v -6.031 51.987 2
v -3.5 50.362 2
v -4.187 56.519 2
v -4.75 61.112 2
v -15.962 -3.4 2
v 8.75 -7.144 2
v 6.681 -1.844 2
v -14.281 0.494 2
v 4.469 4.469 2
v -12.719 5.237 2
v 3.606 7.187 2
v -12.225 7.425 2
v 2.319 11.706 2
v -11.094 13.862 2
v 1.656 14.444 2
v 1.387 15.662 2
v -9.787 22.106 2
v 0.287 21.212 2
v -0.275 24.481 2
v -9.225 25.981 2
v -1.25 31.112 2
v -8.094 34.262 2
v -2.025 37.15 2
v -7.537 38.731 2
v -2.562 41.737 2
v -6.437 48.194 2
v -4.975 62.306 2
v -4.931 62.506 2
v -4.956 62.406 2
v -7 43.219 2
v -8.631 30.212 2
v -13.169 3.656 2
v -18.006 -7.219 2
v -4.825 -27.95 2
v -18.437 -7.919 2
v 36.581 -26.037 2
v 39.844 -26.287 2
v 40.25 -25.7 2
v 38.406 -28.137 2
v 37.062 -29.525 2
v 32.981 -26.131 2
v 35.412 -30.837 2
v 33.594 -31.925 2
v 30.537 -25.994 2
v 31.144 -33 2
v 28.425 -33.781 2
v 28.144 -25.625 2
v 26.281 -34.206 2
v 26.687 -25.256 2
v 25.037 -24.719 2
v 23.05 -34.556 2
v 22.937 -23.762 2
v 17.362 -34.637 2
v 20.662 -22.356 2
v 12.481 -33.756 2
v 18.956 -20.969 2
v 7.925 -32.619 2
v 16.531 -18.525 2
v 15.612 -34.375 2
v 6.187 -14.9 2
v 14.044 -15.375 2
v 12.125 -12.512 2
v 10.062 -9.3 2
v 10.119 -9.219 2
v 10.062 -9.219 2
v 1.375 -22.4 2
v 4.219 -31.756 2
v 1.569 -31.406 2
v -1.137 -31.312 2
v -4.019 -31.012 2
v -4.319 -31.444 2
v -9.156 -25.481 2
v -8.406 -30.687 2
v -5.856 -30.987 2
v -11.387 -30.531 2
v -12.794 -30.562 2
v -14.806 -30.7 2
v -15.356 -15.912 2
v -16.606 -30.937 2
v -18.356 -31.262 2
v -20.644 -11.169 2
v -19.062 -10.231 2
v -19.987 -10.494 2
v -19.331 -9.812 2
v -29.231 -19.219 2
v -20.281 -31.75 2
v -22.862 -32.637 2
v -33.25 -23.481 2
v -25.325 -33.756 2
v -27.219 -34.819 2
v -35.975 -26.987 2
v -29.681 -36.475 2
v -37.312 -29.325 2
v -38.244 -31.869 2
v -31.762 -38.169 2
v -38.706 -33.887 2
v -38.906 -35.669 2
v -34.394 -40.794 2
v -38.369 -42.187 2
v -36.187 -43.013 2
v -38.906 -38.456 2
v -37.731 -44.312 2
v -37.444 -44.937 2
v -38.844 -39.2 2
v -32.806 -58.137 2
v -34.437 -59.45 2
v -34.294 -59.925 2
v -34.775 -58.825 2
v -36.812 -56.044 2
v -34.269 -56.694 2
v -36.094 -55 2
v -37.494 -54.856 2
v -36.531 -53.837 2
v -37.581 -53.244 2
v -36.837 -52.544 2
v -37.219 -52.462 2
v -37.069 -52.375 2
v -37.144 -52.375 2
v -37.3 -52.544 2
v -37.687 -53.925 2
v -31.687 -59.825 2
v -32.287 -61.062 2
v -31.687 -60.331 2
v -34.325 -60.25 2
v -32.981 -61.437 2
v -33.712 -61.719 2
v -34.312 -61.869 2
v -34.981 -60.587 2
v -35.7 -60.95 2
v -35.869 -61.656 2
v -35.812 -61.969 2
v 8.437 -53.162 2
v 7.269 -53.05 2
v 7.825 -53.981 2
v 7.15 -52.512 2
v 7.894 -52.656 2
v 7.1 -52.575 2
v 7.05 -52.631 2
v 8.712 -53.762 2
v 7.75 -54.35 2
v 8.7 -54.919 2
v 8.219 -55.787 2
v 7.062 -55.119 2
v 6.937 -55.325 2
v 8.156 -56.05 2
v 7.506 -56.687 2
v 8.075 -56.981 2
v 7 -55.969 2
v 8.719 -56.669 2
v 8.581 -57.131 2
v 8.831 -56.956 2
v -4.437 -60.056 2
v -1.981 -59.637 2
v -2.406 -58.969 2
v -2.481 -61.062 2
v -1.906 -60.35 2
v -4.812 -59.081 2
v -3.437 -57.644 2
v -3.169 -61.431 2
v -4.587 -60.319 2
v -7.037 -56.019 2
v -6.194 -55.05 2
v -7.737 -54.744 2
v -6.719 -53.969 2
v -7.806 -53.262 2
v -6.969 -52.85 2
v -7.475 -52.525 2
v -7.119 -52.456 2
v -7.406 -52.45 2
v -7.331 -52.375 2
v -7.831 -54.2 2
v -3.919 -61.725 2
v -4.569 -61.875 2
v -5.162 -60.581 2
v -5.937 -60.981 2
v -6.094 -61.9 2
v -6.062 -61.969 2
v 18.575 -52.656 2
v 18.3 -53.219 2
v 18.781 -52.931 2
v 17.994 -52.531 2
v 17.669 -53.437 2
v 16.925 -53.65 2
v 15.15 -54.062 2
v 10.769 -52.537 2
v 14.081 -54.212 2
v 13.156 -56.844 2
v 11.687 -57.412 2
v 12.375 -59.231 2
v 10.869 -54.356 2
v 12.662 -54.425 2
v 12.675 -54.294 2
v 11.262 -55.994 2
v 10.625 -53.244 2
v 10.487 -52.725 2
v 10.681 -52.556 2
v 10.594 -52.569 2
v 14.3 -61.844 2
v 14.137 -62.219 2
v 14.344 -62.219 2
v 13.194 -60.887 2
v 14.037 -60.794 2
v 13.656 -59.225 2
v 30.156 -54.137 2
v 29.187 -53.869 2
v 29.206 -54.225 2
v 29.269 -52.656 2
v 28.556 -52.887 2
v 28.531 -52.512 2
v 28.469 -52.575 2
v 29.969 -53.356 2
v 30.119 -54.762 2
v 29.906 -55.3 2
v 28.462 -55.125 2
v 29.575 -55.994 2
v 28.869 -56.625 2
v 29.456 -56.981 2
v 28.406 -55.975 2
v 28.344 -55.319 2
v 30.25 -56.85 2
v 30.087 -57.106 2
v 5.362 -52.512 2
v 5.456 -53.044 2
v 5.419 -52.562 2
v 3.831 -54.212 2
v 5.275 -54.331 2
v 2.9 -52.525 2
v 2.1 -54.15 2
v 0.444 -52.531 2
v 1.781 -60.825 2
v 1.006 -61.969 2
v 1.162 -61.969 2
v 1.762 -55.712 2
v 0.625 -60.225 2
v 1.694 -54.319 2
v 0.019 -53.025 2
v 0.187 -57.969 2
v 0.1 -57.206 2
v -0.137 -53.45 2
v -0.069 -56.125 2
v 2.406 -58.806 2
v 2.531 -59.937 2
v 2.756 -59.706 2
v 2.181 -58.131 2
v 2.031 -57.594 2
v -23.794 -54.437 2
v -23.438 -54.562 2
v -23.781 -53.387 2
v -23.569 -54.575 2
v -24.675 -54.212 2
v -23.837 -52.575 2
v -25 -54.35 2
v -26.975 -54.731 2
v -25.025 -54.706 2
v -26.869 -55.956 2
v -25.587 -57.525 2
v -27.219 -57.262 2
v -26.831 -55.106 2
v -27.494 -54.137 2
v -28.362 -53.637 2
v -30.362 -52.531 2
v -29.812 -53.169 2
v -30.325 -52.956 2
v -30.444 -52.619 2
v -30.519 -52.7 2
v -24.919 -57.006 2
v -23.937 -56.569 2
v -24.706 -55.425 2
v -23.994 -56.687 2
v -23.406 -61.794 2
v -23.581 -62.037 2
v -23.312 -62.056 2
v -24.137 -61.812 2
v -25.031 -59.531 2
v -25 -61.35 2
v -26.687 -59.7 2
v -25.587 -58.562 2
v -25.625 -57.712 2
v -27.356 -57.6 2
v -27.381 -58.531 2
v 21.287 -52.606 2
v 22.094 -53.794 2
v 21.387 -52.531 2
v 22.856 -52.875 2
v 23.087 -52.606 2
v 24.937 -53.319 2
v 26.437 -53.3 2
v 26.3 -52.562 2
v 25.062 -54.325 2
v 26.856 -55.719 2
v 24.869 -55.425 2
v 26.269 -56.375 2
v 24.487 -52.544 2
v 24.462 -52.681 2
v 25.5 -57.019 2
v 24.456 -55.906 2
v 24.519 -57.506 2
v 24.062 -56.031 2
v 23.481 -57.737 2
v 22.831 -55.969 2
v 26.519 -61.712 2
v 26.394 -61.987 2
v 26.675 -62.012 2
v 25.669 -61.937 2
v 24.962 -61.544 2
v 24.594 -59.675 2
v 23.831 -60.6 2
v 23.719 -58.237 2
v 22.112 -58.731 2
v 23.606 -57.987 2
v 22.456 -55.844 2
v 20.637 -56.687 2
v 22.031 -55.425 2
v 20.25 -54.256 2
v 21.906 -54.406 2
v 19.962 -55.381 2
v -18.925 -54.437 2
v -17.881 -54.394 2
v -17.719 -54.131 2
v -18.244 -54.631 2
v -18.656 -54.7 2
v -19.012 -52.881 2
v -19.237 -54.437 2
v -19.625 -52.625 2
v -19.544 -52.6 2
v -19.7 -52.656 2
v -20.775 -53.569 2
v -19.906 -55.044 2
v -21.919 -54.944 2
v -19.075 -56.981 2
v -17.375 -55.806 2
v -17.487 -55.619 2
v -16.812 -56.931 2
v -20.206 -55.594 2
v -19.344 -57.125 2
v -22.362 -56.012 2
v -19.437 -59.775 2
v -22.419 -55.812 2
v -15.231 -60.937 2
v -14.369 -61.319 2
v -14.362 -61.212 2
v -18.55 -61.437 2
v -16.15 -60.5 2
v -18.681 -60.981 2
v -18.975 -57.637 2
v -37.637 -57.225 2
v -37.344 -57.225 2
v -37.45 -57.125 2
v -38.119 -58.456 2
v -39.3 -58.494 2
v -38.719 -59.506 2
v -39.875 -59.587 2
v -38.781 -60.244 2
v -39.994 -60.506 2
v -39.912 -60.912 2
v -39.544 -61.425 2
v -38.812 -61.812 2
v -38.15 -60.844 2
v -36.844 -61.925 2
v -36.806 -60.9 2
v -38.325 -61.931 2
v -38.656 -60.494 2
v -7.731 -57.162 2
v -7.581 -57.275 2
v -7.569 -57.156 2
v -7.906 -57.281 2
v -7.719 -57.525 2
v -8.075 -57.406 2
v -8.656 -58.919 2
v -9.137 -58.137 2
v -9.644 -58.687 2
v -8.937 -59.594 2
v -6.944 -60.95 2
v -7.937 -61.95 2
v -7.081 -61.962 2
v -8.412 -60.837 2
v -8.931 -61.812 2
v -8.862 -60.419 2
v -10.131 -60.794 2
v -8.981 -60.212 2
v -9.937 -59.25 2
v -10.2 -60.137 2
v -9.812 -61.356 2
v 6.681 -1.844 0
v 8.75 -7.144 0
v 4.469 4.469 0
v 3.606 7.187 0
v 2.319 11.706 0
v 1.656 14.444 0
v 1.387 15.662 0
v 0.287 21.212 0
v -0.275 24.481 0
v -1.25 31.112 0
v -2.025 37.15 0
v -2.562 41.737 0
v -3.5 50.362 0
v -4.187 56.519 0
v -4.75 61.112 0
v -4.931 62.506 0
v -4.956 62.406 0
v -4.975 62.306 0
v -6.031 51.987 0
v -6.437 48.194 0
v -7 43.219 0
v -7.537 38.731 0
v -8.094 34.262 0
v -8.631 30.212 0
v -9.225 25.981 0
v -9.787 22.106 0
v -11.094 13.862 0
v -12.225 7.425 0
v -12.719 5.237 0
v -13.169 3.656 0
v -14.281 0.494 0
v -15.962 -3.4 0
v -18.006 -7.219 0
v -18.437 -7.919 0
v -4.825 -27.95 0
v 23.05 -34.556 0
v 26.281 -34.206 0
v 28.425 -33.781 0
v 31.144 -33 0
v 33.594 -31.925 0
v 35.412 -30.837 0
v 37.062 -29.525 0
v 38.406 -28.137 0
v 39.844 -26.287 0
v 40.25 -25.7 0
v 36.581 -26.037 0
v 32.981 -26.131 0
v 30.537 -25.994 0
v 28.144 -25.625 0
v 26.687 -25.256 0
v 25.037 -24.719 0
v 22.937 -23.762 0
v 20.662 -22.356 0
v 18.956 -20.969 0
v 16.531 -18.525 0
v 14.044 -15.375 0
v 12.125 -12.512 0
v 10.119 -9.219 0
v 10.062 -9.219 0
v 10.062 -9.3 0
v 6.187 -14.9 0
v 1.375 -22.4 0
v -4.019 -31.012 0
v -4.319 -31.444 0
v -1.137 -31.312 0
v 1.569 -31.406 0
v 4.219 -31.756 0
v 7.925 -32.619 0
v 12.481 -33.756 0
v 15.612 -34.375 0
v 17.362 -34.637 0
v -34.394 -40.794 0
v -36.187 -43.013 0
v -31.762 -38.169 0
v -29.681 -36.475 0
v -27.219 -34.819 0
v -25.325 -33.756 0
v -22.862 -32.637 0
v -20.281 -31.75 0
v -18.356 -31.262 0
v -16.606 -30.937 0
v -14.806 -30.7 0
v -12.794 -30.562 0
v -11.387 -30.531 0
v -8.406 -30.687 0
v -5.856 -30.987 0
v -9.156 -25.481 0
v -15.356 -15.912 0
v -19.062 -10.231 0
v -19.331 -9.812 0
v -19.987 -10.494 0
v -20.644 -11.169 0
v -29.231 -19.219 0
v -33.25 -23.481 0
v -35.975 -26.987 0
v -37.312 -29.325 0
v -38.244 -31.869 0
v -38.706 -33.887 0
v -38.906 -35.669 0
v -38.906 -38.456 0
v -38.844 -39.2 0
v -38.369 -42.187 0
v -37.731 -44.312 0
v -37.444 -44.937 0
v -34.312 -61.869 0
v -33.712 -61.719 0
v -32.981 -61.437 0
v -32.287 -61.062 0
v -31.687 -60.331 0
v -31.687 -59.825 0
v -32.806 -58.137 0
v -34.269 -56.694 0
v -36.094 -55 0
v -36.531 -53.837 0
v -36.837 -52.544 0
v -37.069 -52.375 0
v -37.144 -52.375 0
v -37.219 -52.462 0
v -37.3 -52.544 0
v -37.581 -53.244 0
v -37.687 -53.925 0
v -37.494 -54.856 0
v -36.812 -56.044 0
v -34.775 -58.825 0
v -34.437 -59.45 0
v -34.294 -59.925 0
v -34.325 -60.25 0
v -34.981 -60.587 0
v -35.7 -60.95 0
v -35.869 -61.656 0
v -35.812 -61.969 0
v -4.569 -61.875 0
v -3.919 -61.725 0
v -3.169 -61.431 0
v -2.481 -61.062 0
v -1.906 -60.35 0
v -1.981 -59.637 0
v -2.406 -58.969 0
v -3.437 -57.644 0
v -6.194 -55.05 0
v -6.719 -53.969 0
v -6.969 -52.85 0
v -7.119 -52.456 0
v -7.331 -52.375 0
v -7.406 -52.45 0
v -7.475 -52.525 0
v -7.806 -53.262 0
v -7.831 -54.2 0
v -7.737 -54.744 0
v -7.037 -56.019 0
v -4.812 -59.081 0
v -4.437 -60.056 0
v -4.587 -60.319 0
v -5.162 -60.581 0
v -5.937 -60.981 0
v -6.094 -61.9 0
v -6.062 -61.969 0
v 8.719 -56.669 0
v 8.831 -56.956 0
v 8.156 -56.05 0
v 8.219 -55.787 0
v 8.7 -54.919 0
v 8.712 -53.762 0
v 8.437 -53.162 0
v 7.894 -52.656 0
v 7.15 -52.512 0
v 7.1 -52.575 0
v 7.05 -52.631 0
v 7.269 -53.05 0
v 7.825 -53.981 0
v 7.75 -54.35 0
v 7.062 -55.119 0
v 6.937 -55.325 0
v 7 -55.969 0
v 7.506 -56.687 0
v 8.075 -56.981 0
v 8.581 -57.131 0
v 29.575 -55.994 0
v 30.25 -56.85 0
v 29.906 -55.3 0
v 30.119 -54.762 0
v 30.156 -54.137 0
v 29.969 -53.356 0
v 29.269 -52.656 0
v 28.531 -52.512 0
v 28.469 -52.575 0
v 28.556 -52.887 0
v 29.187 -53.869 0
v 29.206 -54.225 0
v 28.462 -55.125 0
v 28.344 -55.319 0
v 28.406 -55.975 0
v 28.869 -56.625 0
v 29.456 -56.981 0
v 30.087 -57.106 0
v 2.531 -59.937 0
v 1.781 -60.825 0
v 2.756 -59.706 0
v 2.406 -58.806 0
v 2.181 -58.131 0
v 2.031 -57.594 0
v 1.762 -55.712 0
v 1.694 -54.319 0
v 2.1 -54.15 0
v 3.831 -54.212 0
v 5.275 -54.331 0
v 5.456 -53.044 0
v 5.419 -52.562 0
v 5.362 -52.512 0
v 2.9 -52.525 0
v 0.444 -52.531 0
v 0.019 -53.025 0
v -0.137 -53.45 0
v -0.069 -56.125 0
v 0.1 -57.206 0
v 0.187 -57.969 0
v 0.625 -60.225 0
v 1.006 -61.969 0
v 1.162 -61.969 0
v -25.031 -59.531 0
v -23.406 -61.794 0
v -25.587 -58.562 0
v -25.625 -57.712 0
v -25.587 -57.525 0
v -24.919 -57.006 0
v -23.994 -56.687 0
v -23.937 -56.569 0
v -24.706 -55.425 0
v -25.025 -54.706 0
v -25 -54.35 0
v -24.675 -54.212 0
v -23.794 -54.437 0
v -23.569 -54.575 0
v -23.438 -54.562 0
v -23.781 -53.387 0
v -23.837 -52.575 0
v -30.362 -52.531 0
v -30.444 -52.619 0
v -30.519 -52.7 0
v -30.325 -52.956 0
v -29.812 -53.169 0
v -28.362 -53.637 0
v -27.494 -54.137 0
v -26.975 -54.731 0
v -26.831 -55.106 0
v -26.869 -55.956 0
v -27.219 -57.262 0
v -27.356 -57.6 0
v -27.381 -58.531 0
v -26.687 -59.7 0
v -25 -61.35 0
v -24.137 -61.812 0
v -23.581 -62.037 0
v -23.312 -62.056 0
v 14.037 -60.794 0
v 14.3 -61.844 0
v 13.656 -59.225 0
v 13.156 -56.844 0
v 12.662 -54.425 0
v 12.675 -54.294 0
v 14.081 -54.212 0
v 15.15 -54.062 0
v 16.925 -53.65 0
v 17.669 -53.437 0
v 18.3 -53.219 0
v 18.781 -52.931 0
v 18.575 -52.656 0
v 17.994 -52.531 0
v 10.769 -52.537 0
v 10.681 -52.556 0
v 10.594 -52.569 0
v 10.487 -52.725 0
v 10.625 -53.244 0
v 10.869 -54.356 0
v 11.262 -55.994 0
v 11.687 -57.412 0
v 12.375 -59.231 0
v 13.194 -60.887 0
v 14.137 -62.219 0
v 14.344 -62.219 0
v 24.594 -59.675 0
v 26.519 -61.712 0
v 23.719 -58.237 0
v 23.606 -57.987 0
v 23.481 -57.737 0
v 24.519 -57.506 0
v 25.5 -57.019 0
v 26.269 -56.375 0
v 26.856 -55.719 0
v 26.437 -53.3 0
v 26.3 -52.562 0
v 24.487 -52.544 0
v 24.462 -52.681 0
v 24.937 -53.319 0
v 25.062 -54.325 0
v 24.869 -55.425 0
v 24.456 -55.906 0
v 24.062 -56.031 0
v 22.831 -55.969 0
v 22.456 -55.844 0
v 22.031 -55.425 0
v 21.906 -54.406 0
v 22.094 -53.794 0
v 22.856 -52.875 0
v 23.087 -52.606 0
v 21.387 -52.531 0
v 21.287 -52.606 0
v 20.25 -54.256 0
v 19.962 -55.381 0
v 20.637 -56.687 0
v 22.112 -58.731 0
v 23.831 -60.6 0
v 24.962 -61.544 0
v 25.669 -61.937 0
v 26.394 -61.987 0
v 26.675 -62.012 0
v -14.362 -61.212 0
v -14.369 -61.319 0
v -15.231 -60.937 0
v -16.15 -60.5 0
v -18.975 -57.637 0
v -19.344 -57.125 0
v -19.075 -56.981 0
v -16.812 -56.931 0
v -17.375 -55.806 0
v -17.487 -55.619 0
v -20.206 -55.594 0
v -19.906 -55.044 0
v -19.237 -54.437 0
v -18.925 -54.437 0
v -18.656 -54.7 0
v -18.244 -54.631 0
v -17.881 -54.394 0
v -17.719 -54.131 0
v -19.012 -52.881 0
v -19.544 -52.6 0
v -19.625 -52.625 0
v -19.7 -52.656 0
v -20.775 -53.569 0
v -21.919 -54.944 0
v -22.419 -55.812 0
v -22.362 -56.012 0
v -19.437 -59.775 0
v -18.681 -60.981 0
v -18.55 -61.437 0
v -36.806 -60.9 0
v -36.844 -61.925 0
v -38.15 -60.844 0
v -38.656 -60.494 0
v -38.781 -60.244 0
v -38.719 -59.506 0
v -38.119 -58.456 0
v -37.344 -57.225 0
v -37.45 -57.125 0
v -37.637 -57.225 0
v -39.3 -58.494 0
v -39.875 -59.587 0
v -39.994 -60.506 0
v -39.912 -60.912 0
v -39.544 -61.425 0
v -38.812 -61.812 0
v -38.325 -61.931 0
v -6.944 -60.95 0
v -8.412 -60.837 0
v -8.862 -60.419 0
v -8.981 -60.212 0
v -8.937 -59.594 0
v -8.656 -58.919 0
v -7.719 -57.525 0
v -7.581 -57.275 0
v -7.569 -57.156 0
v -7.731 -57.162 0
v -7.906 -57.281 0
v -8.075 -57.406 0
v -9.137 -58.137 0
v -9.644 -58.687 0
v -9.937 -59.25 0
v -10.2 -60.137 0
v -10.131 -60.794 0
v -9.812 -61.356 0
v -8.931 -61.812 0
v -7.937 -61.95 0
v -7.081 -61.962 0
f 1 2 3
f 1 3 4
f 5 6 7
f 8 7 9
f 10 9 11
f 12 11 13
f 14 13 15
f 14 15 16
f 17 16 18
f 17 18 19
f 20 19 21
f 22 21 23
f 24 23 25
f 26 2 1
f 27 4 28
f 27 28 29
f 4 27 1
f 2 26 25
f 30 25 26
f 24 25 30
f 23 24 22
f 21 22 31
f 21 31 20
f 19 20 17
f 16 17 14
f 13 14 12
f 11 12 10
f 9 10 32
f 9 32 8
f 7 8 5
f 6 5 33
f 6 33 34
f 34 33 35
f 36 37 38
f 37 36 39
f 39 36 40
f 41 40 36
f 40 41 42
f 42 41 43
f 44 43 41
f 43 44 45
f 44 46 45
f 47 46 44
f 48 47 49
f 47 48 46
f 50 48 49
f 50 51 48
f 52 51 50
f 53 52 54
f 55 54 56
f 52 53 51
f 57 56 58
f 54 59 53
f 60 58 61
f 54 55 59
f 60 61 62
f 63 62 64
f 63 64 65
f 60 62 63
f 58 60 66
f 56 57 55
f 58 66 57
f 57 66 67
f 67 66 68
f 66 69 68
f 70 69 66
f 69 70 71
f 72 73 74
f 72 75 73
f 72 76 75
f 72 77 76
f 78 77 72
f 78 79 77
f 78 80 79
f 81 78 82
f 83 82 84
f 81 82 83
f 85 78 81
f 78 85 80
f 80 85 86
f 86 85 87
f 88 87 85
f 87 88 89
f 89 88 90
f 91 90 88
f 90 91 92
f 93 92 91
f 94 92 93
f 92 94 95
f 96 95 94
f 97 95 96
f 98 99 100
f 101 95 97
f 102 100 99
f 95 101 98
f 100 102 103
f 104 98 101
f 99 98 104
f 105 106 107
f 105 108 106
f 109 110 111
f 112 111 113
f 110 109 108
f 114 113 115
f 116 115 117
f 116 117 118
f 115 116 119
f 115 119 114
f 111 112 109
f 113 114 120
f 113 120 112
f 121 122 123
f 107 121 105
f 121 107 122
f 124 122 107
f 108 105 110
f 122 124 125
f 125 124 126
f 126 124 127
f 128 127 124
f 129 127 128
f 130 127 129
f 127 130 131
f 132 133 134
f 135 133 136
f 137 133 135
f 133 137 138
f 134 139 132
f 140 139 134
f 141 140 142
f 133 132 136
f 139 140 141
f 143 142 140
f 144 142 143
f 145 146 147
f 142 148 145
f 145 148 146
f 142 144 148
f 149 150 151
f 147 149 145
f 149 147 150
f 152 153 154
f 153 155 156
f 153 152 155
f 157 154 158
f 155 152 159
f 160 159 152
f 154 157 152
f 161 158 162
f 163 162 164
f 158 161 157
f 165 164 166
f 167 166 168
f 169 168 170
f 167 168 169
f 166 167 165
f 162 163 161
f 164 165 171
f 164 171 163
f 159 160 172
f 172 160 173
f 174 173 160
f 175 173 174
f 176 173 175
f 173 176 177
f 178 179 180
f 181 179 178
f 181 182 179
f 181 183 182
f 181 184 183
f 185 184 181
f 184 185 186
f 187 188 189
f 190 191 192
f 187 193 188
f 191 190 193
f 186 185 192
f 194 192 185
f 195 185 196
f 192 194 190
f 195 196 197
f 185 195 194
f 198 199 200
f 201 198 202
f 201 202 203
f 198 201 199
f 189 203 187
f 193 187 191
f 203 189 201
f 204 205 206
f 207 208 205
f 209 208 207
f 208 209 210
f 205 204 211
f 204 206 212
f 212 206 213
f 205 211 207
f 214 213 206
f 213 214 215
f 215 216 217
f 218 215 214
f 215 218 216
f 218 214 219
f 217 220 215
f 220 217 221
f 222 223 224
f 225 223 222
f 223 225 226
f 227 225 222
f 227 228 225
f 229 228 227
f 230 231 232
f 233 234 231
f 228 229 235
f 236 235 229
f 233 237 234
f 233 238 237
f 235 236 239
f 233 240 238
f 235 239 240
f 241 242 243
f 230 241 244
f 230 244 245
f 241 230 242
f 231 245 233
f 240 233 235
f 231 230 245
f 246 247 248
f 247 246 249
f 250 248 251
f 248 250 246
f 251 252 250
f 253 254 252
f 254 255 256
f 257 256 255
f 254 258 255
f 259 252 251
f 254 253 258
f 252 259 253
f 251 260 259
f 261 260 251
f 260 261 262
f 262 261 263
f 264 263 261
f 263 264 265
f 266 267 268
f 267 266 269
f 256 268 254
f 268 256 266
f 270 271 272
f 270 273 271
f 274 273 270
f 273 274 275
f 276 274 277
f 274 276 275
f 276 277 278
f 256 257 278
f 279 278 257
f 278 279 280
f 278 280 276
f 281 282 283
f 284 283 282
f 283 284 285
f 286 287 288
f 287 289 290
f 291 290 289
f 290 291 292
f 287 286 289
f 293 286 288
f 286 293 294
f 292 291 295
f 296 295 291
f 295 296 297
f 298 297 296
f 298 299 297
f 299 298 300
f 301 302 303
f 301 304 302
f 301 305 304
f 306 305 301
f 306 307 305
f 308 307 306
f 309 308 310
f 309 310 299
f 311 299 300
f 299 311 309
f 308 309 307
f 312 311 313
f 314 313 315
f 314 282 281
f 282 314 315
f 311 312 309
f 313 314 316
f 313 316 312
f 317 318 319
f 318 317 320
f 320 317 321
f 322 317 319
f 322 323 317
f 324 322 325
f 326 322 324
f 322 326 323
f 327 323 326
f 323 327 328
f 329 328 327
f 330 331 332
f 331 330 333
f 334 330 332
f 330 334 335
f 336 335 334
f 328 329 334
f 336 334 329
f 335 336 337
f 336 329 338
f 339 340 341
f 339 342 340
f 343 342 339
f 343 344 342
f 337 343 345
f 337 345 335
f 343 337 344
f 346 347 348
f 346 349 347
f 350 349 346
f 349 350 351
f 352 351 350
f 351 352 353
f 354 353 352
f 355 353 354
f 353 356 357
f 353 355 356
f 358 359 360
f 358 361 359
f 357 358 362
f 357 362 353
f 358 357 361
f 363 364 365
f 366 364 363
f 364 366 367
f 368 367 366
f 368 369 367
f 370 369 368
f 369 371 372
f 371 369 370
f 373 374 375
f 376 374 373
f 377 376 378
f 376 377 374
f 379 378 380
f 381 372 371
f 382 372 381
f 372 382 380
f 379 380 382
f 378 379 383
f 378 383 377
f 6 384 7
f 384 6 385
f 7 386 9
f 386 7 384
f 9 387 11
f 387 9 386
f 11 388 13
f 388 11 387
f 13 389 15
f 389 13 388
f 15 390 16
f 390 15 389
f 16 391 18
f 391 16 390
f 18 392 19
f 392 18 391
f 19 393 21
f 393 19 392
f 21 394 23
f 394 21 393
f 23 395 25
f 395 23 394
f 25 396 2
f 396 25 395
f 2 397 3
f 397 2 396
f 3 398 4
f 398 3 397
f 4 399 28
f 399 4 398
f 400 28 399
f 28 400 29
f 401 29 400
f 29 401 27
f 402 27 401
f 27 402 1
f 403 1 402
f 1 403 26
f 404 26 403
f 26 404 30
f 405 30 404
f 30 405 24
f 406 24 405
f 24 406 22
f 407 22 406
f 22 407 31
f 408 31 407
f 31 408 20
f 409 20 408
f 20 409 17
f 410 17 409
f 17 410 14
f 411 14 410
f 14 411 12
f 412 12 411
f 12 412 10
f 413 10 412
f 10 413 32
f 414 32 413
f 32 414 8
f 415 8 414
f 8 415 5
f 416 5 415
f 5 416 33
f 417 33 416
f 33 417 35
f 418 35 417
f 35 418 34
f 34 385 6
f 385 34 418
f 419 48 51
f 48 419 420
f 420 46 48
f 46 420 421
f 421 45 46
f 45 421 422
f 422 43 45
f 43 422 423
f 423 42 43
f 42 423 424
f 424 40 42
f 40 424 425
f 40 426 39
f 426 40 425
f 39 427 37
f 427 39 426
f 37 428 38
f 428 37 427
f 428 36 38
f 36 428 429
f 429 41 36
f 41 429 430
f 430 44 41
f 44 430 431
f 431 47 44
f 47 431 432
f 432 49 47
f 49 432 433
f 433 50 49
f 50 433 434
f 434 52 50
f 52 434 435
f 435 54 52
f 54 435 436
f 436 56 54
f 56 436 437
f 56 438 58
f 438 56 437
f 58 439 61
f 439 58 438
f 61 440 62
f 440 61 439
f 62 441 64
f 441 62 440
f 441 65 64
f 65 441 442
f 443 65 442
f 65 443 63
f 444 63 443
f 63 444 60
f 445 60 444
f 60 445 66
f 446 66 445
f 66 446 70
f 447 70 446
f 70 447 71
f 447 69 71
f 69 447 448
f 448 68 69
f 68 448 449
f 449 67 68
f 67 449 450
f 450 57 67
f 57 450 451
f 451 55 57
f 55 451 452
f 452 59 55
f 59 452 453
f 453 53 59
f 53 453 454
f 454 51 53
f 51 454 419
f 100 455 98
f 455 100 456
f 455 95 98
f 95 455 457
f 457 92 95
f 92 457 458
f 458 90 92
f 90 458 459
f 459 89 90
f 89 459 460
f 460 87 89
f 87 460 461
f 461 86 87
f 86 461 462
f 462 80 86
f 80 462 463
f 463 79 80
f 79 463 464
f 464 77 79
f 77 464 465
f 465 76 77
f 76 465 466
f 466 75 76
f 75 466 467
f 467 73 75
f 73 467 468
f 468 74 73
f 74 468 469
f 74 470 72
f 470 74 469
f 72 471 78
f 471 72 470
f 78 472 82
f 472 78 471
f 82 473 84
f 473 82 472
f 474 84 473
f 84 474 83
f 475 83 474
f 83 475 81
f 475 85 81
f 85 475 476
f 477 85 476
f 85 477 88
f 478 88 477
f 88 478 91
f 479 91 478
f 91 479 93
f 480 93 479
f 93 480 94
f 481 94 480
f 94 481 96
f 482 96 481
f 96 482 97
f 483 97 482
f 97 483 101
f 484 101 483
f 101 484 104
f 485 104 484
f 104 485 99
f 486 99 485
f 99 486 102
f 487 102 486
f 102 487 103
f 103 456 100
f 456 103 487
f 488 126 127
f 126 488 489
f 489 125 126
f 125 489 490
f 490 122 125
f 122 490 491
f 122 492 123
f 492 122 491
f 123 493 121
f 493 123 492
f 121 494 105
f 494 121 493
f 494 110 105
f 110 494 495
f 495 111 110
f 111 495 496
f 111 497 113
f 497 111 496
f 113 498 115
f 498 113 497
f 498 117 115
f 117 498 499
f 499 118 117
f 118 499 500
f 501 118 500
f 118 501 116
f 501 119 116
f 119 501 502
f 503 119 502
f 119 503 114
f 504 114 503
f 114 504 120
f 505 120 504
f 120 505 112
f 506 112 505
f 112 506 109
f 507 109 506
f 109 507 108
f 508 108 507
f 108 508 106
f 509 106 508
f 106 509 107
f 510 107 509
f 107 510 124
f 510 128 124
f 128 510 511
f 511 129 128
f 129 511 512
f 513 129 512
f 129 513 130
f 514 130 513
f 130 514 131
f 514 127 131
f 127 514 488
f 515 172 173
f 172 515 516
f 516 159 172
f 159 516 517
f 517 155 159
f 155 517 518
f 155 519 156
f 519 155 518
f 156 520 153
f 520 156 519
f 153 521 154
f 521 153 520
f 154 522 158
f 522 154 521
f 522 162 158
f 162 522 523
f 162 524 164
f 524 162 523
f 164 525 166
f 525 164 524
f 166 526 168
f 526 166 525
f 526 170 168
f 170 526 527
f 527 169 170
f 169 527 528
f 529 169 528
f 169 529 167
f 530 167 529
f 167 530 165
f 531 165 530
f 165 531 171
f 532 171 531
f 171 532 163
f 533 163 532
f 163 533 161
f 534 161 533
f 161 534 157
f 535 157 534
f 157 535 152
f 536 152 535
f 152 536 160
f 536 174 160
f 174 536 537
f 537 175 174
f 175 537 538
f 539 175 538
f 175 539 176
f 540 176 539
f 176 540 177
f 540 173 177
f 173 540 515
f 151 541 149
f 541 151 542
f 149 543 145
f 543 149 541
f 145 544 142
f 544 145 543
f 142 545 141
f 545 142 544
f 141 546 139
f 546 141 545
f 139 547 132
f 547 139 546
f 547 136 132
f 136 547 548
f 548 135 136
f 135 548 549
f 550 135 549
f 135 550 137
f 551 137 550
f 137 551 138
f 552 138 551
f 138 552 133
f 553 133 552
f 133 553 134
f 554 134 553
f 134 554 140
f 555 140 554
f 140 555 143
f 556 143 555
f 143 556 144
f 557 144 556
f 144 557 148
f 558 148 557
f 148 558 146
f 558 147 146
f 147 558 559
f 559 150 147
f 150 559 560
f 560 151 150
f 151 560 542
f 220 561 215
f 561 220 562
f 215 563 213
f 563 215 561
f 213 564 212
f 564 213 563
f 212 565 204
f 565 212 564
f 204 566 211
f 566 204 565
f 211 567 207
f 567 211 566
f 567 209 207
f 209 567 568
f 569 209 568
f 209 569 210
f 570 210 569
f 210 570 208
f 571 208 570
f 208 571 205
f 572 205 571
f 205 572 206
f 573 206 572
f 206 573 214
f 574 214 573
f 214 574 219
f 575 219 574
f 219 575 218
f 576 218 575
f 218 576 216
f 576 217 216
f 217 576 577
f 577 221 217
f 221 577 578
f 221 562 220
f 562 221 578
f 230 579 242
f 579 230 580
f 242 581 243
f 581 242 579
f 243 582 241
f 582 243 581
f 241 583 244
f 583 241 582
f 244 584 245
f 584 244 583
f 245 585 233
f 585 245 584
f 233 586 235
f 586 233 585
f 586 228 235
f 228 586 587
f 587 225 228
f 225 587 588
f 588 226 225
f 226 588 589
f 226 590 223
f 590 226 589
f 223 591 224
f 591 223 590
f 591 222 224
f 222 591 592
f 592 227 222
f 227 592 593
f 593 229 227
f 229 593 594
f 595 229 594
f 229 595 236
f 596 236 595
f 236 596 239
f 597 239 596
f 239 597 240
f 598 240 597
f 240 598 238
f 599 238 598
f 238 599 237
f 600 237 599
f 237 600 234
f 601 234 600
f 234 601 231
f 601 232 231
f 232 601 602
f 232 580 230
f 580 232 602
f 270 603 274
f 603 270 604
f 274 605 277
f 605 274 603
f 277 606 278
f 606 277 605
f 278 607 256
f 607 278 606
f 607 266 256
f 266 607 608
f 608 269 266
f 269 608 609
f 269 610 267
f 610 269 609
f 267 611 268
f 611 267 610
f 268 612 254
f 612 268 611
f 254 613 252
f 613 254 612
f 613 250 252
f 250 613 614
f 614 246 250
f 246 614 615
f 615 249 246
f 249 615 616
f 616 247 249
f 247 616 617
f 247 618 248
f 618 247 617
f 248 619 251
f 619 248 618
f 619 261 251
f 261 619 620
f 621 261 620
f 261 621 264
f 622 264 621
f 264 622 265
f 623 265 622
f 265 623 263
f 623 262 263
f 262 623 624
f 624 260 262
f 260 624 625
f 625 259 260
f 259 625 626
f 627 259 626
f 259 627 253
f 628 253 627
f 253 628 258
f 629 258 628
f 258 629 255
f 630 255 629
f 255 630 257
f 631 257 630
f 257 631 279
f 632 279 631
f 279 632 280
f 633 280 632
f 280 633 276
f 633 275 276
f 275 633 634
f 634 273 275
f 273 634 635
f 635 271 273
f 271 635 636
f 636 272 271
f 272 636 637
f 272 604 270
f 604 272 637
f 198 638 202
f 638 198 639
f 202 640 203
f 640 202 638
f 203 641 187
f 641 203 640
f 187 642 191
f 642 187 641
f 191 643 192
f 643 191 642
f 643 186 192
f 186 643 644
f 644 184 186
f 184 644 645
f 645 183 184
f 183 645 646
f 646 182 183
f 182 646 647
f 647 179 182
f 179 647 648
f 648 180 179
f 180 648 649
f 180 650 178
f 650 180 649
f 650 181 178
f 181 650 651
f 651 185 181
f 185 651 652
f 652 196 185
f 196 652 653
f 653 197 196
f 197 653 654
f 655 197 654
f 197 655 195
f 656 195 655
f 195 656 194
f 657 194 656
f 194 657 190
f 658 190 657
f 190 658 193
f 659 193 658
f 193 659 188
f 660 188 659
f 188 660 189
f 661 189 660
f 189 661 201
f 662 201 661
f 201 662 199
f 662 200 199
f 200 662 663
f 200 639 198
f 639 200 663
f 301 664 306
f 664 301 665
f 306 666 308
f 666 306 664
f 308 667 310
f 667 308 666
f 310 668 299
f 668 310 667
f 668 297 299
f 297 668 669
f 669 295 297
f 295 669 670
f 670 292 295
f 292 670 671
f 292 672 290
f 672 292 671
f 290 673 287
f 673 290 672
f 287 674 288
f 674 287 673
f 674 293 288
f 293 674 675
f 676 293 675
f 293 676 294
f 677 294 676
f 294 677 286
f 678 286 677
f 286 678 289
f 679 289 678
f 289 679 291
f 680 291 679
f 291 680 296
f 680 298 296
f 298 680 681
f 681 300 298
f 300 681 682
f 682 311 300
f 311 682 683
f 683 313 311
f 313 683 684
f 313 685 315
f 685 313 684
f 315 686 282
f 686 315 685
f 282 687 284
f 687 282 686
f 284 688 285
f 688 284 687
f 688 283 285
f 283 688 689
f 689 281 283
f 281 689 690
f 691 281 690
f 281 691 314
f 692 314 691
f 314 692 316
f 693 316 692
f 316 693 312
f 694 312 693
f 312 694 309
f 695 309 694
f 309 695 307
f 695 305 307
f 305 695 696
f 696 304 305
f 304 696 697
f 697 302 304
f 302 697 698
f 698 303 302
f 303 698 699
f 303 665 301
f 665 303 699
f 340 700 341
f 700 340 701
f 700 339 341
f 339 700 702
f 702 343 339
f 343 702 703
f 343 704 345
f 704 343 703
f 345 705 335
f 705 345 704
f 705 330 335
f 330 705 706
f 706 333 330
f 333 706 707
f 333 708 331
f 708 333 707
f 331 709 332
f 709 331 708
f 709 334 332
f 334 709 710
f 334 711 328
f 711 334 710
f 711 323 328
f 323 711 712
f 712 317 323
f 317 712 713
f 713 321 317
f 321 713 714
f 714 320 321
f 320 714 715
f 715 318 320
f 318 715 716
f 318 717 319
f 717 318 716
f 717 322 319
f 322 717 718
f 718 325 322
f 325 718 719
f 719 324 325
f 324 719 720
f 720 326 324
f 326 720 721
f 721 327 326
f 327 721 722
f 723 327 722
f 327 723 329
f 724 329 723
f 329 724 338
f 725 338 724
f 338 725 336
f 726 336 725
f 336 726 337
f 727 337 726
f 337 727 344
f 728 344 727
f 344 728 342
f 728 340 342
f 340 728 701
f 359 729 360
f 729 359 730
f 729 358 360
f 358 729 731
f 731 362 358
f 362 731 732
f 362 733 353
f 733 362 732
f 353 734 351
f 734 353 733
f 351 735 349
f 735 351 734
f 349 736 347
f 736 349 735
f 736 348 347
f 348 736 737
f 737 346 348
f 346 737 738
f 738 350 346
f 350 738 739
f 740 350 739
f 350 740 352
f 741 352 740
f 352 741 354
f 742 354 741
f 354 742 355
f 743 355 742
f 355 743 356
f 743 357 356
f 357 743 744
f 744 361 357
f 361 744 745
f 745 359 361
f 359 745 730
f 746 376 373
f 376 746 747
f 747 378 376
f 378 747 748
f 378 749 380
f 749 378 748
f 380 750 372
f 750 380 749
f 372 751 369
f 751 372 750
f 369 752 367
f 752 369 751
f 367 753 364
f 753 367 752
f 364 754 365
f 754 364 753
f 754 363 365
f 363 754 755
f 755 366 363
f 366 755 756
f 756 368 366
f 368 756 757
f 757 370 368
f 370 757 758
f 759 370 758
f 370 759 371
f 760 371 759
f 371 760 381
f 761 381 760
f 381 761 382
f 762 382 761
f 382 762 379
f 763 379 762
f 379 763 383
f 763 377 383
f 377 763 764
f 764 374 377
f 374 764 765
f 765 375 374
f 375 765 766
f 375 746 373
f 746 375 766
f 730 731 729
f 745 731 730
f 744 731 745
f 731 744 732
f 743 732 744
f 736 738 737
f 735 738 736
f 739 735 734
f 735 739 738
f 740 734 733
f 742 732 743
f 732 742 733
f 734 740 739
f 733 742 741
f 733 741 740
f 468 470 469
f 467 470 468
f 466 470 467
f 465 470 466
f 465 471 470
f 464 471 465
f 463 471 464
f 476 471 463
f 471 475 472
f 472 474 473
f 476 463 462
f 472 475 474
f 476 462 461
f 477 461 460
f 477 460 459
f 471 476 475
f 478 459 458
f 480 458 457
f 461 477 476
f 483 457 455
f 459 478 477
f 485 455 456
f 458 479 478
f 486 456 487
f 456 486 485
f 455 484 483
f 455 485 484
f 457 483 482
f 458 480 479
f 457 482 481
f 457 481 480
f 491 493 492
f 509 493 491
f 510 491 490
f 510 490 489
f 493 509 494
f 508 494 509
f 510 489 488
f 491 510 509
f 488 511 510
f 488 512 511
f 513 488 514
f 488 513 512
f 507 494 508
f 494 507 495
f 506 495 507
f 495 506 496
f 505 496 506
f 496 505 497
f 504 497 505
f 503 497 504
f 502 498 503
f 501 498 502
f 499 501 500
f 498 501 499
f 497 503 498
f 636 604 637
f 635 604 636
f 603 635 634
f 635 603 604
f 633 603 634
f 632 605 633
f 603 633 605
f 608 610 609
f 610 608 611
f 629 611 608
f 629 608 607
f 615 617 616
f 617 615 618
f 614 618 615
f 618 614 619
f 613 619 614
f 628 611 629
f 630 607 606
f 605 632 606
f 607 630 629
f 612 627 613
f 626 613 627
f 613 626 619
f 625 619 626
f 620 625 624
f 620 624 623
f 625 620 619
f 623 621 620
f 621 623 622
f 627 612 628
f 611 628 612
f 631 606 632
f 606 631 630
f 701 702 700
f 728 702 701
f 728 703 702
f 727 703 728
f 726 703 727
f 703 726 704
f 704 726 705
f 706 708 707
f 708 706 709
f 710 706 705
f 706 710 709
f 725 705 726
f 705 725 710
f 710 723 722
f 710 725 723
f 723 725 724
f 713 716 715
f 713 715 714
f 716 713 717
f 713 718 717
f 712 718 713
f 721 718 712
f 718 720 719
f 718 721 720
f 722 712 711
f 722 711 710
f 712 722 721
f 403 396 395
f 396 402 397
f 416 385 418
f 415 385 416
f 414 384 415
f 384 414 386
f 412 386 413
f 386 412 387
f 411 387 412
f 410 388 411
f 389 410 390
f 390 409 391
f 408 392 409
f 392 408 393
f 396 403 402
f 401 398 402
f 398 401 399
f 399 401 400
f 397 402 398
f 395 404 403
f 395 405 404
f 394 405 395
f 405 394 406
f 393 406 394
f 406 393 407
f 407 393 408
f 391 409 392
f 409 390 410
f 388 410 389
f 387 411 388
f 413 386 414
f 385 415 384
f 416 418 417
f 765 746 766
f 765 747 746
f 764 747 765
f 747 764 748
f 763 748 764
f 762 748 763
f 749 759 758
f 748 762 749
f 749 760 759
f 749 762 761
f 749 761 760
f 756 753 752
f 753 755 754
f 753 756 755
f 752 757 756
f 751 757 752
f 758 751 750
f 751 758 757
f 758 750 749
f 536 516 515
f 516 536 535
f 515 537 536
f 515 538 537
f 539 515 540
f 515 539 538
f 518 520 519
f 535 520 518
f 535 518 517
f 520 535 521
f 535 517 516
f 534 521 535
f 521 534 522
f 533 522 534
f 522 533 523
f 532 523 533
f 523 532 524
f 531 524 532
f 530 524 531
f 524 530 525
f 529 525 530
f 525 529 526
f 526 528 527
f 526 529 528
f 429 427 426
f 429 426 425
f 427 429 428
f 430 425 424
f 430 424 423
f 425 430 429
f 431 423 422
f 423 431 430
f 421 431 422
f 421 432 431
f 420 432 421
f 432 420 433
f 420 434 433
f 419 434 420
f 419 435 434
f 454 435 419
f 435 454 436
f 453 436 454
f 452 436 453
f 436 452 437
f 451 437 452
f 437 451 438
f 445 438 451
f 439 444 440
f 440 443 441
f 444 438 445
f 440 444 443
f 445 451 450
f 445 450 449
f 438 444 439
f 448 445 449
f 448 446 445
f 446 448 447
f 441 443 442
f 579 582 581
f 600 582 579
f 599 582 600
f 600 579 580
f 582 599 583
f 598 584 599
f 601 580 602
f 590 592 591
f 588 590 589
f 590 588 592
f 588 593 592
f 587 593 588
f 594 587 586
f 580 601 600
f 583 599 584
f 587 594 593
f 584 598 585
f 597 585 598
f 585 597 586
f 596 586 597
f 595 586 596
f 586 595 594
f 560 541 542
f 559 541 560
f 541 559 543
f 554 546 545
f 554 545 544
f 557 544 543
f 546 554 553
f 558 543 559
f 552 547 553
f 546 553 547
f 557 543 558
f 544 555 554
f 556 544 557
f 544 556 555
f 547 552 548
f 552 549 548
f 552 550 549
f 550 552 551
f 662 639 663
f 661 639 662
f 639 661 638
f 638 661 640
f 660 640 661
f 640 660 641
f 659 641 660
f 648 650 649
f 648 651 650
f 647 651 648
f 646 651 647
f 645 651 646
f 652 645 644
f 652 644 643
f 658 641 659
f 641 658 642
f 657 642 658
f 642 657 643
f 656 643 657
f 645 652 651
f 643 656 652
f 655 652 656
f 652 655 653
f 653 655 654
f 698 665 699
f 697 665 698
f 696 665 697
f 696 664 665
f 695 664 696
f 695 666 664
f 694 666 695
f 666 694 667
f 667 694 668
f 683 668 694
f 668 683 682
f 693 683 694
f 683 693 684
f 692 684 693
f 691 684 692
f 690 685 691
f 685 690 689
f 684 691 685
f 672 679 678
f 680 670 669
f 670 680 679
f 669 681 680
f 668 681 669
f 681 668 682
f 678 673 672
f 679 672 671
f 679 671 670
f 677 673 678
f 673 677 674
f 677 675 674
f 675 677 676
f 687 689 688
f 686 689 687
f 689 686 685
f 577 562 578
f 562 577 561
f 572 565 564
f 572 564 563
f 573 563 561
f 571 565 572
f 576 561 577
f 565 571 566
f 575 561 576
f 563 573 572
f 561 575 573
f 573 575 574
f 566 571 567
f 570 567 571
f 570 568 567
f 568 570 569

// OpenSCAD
module b8886e8a5c69d4f601d2fd4799ef9ff8_1()
{
 /* Generated by trace2scad version 20150415
    http://aggregate.org/MAKE/TRACE2SCAD/
    Optimized model has 387/4796 original points
 */
 color([0.48, 0.48, 0.48])
 assign(minx=0) /* polygon minx=39 */
 assign(miny=0) /* polygon miny=45 */
 assign(maxx=12880) /* polygon maxx=12880 */
 assign(maxy=20000) /* polygon maxy=20001 */
 assign(dx=maxx-minx)
 assign(dy=maxy-miny)
 assign(maxd=((dx>dy)?dx:dy))
 scale([1/maxd, 1/maxd, 1])
 translate([-minx-dx/2, -miny-dy/2, 0])
 linear_extrude(height=1, convexity=387)
 union() {
  union() {
   polygon([[5647,19985],[5644,19969],[5475,18318],[5410,17711],[5320,16915],[5234,16197],[5145,15482],[5059,14834],[4964,14157],[4874,13537],[4665,12218],[4484,11188],[4405,10838],[4333,10585],[4155,10079],[3886,9456],[3559,8845],[3490,8733],[5668,5528],[7840,8857],[7509,9705],[7155,10715],[7017,11150],[6811,11873],[6705,12311],[6662,12506],[6486,13394],[6396,13917],[6240,14978],[6116,15944],[6030,16678],[5880,18058],[5770,19043],[5680,19778],[5651,20001]], convexity=6);
   polygon([[8050,8518],[8050,8512],[7430,7616],[6660,6416],[5797,5038],[5749,4969],[6258,4990],[6691,4975],[7115,4919],[7708,4781],[8437,4599],[8938,4500],[9218,4458],[10128,4471],[10645,4527],[10988,4595],[11423,4720],[11815,4892],[12106,5066],[12370,5276],[12585,5498],[12815,5794],[12880,5888],[12293,5834],[11717,5819],[11326,5841],[10943,5900],[10710,5959],[10446,6045],[10110,6198],[9746,6423],[9473,6645],[9085,7036],[8687,7540],[8380,7998],[8059,8525],[8050,8525]], convexity=9);
   polygon([[3242,8321],[3137,8213],[1763,6925],[1120,6243],[684,5682],[470,5308],[321,4901],[247,4578],[215,4293],[215,3847],[225,3728],[301,3250],[403,2910],[449,2810],[650,3118],[937,3473],[1358,3893],[1691,4164],[2085,4429],[2388,4599],[2782,4778],[3195,4920],[3503,4998],[3783,5050],[4071,5088],[4393,5110],[4618,5115],[5095,5090],[5503,5042],[4975,5923],[3983,7454],[3390,8363],[3347,8430]], convexity=7);
   polygon([[485,1606],[472,1593],[427,1481],[410,1372],[441,1223],[550,1033],[876,588],[930,488],[953,412],[948,360],[843,306],[728,248],[701,135],[710,85],[950,101],[1046,125],[1163,170],[1274,230],[1370,347],[1370,428],[1191,698],[957,929],[665,1200],[595,1386],[546,1593],[509,1620],[497,1620]], convexity=8);
   polygon([[5255,1608],[5244,1596],[5191,1478],[5187,1328],[5202,1241],[5314,1037],[5670,547],[5730,391],[5706,349],[5614,307],[5490,243],[5465,96],[5470,85],[5709,100],[5813,124],[5933,171],[6043,230],[6135,344],[6123,458],[6055,565],[5890,777],[5449,1192],[5365,1365],[5325,1544],[5301,1607],[5267,1620]], convexity=8);
   polygon([[6904,1596],[6511,1595],[6443,1516],[6418,1448],[6429,1020],[6456,847],[6470,725],[6540,364],[6601,85],[6626,85],[6725,268],[6845,410],[6881,447],[6825,591],[6789,699],[6765,785],[6722,1086],[6711,1309],[6776,1336],[7053,1326],[7284,1307],[7313,1513],[7307,1590],[7298,1598]], convexity=10);
   polygon([[7576,1588],[7568,1579],[7603,1512],[7692,1363],[7680,1304],[7570,1181],[7550,1148],[7560,1045],[7641,930],[7732,883],[7813,859],[7853,887],[7835,933],[7745,1032],[7755,1074],[7832,1213],[7834,1398],[7790,1494],[7703,1575],[7584,1598]], convexity=10);
   polygon([[11000,1593],[10995,1588],[11009,1538],[11110,1381],[11113,1324],[10994,1180],[10975,1149],[10985,1044],[11059,940],[11153,883],[11254,863],[11280,904],[11172,1041],[11225,1152],[11259,1238],[11265,1338],[11235,1463],[11123,1575],[11005,1598]], convexity=10);
   polygon([[1569,1581],[1557,1568],[1588,1527],[1670,1493],[1902,1418],[2041,1338],[2124,1243],[2147,1183],[2141,1047],[2085,838],[2063,784],[2059,635],[2170,448],[2440,184],[2578,110],[2667,74],[2710,71],[2695,113],[2435,475],[2346,630],[2340,766],[2346,796],[2453,879],[2601,930],[2610,949],[2487,1132],[2436,1247],[2440,1304],[2492,1326],[2633,1290],[2669,1268],[2690,1270],[2635,1458],[2626,1588],[1582,1595]], convexity=13);
   polygon([[8149,1591],[8135,1589],[8118,1564],[8140,1481],[8179,1303],[8242,1041],[8310,814],[8420,523],[8551,258],[8702,45],[8735,45],[8728,105],[8686,273],[8625,524],[8545,905],[8466,1292],[8468,1313],[8693,1326],[8864,1350],[9148,1416],[9267,1450],[9368,1485],[9445,1531],[9412,1575],[9319,1595],[8163,1594]], convexity=9);
   polygon([[9854,1589],[9846,1583],[9680,1319],[9634,1139],[9742,930],[9978,603],[10253,304],[10434,153],[10547,90],[10663,82],[10708,78],[10683,126],[10375,452],[10235,682],[10217,722],[10197,762],[10363,799],[10520,877],[10643,980],[10737,1085],[10670,1472],[10648,1590],[10358,1593],[10354,1571],[10430,1469],[10450,1308],[10419,1132],[10353,1055],[10290,1035],[10093,1045],[10033,1065],[9965,1132],[9945,1295],[9975,1393],[10097,1540],[10134,1583],[9862,1595]], convexity=13);
   polygon([[3300,1580],[3288,1575],[3116,1429],[2933,1209],[2853,1070],[2862,1038],[3330,436],[3451,243],[3472,170],[4141,189],[4142,206],[4003,250],[3856,320],[3404,778],[3345,860],[3388,883],[3750,891],[3660,1071],[3642,1101],[3207,1105],[3255,1193],[3362,1290],[3412,1290],[3455,1248],[3521,1259],[3579,1297],[3605,1339],[3398,1539],[3313,1584]], convexity=12);
   polygon([[433,852],[418,844],[152,641],[60,466],[41,319],[54,254],[113,172],[230,110],[308,91],[545,92],[551,256],[336,265],[255,321],[235,361],[245,479],[341,647],[465,844],[448,860]], convexity=8);
   polygon([[5175,835],[5148,815],[4978,698],[4897,610],[4850,520],[4808,378],[4819,273],[4870,183],[5011,110],[5170,88],[5307,86],[5329,248],[5094,266],[5022,333],[5003,366],[5010,465],[5055,573],[5205,796],[5227,836],[5229,855],[5203,854]], convexity=8);
  }
 }
}

module b8886e8a5c69d4f601d2fd4799ef9ff8()
{
 /* all layers combined, scaled to within a 1mm cube */
 scale([1, 1, 1/1])
 difference() {
  union() {
   scale([1,1,2]) translate([0,0,-0.5]) b8886e8a5c69d4f601d2fd4799ef9ff8_1();
  }
  translate([0,0,-2]) cube([2,2,4],center=true);
 }
}

scale([125, 125, 2]) {
	b8886e8a5c69d4f601d2fd4799ef9ff8();
}
